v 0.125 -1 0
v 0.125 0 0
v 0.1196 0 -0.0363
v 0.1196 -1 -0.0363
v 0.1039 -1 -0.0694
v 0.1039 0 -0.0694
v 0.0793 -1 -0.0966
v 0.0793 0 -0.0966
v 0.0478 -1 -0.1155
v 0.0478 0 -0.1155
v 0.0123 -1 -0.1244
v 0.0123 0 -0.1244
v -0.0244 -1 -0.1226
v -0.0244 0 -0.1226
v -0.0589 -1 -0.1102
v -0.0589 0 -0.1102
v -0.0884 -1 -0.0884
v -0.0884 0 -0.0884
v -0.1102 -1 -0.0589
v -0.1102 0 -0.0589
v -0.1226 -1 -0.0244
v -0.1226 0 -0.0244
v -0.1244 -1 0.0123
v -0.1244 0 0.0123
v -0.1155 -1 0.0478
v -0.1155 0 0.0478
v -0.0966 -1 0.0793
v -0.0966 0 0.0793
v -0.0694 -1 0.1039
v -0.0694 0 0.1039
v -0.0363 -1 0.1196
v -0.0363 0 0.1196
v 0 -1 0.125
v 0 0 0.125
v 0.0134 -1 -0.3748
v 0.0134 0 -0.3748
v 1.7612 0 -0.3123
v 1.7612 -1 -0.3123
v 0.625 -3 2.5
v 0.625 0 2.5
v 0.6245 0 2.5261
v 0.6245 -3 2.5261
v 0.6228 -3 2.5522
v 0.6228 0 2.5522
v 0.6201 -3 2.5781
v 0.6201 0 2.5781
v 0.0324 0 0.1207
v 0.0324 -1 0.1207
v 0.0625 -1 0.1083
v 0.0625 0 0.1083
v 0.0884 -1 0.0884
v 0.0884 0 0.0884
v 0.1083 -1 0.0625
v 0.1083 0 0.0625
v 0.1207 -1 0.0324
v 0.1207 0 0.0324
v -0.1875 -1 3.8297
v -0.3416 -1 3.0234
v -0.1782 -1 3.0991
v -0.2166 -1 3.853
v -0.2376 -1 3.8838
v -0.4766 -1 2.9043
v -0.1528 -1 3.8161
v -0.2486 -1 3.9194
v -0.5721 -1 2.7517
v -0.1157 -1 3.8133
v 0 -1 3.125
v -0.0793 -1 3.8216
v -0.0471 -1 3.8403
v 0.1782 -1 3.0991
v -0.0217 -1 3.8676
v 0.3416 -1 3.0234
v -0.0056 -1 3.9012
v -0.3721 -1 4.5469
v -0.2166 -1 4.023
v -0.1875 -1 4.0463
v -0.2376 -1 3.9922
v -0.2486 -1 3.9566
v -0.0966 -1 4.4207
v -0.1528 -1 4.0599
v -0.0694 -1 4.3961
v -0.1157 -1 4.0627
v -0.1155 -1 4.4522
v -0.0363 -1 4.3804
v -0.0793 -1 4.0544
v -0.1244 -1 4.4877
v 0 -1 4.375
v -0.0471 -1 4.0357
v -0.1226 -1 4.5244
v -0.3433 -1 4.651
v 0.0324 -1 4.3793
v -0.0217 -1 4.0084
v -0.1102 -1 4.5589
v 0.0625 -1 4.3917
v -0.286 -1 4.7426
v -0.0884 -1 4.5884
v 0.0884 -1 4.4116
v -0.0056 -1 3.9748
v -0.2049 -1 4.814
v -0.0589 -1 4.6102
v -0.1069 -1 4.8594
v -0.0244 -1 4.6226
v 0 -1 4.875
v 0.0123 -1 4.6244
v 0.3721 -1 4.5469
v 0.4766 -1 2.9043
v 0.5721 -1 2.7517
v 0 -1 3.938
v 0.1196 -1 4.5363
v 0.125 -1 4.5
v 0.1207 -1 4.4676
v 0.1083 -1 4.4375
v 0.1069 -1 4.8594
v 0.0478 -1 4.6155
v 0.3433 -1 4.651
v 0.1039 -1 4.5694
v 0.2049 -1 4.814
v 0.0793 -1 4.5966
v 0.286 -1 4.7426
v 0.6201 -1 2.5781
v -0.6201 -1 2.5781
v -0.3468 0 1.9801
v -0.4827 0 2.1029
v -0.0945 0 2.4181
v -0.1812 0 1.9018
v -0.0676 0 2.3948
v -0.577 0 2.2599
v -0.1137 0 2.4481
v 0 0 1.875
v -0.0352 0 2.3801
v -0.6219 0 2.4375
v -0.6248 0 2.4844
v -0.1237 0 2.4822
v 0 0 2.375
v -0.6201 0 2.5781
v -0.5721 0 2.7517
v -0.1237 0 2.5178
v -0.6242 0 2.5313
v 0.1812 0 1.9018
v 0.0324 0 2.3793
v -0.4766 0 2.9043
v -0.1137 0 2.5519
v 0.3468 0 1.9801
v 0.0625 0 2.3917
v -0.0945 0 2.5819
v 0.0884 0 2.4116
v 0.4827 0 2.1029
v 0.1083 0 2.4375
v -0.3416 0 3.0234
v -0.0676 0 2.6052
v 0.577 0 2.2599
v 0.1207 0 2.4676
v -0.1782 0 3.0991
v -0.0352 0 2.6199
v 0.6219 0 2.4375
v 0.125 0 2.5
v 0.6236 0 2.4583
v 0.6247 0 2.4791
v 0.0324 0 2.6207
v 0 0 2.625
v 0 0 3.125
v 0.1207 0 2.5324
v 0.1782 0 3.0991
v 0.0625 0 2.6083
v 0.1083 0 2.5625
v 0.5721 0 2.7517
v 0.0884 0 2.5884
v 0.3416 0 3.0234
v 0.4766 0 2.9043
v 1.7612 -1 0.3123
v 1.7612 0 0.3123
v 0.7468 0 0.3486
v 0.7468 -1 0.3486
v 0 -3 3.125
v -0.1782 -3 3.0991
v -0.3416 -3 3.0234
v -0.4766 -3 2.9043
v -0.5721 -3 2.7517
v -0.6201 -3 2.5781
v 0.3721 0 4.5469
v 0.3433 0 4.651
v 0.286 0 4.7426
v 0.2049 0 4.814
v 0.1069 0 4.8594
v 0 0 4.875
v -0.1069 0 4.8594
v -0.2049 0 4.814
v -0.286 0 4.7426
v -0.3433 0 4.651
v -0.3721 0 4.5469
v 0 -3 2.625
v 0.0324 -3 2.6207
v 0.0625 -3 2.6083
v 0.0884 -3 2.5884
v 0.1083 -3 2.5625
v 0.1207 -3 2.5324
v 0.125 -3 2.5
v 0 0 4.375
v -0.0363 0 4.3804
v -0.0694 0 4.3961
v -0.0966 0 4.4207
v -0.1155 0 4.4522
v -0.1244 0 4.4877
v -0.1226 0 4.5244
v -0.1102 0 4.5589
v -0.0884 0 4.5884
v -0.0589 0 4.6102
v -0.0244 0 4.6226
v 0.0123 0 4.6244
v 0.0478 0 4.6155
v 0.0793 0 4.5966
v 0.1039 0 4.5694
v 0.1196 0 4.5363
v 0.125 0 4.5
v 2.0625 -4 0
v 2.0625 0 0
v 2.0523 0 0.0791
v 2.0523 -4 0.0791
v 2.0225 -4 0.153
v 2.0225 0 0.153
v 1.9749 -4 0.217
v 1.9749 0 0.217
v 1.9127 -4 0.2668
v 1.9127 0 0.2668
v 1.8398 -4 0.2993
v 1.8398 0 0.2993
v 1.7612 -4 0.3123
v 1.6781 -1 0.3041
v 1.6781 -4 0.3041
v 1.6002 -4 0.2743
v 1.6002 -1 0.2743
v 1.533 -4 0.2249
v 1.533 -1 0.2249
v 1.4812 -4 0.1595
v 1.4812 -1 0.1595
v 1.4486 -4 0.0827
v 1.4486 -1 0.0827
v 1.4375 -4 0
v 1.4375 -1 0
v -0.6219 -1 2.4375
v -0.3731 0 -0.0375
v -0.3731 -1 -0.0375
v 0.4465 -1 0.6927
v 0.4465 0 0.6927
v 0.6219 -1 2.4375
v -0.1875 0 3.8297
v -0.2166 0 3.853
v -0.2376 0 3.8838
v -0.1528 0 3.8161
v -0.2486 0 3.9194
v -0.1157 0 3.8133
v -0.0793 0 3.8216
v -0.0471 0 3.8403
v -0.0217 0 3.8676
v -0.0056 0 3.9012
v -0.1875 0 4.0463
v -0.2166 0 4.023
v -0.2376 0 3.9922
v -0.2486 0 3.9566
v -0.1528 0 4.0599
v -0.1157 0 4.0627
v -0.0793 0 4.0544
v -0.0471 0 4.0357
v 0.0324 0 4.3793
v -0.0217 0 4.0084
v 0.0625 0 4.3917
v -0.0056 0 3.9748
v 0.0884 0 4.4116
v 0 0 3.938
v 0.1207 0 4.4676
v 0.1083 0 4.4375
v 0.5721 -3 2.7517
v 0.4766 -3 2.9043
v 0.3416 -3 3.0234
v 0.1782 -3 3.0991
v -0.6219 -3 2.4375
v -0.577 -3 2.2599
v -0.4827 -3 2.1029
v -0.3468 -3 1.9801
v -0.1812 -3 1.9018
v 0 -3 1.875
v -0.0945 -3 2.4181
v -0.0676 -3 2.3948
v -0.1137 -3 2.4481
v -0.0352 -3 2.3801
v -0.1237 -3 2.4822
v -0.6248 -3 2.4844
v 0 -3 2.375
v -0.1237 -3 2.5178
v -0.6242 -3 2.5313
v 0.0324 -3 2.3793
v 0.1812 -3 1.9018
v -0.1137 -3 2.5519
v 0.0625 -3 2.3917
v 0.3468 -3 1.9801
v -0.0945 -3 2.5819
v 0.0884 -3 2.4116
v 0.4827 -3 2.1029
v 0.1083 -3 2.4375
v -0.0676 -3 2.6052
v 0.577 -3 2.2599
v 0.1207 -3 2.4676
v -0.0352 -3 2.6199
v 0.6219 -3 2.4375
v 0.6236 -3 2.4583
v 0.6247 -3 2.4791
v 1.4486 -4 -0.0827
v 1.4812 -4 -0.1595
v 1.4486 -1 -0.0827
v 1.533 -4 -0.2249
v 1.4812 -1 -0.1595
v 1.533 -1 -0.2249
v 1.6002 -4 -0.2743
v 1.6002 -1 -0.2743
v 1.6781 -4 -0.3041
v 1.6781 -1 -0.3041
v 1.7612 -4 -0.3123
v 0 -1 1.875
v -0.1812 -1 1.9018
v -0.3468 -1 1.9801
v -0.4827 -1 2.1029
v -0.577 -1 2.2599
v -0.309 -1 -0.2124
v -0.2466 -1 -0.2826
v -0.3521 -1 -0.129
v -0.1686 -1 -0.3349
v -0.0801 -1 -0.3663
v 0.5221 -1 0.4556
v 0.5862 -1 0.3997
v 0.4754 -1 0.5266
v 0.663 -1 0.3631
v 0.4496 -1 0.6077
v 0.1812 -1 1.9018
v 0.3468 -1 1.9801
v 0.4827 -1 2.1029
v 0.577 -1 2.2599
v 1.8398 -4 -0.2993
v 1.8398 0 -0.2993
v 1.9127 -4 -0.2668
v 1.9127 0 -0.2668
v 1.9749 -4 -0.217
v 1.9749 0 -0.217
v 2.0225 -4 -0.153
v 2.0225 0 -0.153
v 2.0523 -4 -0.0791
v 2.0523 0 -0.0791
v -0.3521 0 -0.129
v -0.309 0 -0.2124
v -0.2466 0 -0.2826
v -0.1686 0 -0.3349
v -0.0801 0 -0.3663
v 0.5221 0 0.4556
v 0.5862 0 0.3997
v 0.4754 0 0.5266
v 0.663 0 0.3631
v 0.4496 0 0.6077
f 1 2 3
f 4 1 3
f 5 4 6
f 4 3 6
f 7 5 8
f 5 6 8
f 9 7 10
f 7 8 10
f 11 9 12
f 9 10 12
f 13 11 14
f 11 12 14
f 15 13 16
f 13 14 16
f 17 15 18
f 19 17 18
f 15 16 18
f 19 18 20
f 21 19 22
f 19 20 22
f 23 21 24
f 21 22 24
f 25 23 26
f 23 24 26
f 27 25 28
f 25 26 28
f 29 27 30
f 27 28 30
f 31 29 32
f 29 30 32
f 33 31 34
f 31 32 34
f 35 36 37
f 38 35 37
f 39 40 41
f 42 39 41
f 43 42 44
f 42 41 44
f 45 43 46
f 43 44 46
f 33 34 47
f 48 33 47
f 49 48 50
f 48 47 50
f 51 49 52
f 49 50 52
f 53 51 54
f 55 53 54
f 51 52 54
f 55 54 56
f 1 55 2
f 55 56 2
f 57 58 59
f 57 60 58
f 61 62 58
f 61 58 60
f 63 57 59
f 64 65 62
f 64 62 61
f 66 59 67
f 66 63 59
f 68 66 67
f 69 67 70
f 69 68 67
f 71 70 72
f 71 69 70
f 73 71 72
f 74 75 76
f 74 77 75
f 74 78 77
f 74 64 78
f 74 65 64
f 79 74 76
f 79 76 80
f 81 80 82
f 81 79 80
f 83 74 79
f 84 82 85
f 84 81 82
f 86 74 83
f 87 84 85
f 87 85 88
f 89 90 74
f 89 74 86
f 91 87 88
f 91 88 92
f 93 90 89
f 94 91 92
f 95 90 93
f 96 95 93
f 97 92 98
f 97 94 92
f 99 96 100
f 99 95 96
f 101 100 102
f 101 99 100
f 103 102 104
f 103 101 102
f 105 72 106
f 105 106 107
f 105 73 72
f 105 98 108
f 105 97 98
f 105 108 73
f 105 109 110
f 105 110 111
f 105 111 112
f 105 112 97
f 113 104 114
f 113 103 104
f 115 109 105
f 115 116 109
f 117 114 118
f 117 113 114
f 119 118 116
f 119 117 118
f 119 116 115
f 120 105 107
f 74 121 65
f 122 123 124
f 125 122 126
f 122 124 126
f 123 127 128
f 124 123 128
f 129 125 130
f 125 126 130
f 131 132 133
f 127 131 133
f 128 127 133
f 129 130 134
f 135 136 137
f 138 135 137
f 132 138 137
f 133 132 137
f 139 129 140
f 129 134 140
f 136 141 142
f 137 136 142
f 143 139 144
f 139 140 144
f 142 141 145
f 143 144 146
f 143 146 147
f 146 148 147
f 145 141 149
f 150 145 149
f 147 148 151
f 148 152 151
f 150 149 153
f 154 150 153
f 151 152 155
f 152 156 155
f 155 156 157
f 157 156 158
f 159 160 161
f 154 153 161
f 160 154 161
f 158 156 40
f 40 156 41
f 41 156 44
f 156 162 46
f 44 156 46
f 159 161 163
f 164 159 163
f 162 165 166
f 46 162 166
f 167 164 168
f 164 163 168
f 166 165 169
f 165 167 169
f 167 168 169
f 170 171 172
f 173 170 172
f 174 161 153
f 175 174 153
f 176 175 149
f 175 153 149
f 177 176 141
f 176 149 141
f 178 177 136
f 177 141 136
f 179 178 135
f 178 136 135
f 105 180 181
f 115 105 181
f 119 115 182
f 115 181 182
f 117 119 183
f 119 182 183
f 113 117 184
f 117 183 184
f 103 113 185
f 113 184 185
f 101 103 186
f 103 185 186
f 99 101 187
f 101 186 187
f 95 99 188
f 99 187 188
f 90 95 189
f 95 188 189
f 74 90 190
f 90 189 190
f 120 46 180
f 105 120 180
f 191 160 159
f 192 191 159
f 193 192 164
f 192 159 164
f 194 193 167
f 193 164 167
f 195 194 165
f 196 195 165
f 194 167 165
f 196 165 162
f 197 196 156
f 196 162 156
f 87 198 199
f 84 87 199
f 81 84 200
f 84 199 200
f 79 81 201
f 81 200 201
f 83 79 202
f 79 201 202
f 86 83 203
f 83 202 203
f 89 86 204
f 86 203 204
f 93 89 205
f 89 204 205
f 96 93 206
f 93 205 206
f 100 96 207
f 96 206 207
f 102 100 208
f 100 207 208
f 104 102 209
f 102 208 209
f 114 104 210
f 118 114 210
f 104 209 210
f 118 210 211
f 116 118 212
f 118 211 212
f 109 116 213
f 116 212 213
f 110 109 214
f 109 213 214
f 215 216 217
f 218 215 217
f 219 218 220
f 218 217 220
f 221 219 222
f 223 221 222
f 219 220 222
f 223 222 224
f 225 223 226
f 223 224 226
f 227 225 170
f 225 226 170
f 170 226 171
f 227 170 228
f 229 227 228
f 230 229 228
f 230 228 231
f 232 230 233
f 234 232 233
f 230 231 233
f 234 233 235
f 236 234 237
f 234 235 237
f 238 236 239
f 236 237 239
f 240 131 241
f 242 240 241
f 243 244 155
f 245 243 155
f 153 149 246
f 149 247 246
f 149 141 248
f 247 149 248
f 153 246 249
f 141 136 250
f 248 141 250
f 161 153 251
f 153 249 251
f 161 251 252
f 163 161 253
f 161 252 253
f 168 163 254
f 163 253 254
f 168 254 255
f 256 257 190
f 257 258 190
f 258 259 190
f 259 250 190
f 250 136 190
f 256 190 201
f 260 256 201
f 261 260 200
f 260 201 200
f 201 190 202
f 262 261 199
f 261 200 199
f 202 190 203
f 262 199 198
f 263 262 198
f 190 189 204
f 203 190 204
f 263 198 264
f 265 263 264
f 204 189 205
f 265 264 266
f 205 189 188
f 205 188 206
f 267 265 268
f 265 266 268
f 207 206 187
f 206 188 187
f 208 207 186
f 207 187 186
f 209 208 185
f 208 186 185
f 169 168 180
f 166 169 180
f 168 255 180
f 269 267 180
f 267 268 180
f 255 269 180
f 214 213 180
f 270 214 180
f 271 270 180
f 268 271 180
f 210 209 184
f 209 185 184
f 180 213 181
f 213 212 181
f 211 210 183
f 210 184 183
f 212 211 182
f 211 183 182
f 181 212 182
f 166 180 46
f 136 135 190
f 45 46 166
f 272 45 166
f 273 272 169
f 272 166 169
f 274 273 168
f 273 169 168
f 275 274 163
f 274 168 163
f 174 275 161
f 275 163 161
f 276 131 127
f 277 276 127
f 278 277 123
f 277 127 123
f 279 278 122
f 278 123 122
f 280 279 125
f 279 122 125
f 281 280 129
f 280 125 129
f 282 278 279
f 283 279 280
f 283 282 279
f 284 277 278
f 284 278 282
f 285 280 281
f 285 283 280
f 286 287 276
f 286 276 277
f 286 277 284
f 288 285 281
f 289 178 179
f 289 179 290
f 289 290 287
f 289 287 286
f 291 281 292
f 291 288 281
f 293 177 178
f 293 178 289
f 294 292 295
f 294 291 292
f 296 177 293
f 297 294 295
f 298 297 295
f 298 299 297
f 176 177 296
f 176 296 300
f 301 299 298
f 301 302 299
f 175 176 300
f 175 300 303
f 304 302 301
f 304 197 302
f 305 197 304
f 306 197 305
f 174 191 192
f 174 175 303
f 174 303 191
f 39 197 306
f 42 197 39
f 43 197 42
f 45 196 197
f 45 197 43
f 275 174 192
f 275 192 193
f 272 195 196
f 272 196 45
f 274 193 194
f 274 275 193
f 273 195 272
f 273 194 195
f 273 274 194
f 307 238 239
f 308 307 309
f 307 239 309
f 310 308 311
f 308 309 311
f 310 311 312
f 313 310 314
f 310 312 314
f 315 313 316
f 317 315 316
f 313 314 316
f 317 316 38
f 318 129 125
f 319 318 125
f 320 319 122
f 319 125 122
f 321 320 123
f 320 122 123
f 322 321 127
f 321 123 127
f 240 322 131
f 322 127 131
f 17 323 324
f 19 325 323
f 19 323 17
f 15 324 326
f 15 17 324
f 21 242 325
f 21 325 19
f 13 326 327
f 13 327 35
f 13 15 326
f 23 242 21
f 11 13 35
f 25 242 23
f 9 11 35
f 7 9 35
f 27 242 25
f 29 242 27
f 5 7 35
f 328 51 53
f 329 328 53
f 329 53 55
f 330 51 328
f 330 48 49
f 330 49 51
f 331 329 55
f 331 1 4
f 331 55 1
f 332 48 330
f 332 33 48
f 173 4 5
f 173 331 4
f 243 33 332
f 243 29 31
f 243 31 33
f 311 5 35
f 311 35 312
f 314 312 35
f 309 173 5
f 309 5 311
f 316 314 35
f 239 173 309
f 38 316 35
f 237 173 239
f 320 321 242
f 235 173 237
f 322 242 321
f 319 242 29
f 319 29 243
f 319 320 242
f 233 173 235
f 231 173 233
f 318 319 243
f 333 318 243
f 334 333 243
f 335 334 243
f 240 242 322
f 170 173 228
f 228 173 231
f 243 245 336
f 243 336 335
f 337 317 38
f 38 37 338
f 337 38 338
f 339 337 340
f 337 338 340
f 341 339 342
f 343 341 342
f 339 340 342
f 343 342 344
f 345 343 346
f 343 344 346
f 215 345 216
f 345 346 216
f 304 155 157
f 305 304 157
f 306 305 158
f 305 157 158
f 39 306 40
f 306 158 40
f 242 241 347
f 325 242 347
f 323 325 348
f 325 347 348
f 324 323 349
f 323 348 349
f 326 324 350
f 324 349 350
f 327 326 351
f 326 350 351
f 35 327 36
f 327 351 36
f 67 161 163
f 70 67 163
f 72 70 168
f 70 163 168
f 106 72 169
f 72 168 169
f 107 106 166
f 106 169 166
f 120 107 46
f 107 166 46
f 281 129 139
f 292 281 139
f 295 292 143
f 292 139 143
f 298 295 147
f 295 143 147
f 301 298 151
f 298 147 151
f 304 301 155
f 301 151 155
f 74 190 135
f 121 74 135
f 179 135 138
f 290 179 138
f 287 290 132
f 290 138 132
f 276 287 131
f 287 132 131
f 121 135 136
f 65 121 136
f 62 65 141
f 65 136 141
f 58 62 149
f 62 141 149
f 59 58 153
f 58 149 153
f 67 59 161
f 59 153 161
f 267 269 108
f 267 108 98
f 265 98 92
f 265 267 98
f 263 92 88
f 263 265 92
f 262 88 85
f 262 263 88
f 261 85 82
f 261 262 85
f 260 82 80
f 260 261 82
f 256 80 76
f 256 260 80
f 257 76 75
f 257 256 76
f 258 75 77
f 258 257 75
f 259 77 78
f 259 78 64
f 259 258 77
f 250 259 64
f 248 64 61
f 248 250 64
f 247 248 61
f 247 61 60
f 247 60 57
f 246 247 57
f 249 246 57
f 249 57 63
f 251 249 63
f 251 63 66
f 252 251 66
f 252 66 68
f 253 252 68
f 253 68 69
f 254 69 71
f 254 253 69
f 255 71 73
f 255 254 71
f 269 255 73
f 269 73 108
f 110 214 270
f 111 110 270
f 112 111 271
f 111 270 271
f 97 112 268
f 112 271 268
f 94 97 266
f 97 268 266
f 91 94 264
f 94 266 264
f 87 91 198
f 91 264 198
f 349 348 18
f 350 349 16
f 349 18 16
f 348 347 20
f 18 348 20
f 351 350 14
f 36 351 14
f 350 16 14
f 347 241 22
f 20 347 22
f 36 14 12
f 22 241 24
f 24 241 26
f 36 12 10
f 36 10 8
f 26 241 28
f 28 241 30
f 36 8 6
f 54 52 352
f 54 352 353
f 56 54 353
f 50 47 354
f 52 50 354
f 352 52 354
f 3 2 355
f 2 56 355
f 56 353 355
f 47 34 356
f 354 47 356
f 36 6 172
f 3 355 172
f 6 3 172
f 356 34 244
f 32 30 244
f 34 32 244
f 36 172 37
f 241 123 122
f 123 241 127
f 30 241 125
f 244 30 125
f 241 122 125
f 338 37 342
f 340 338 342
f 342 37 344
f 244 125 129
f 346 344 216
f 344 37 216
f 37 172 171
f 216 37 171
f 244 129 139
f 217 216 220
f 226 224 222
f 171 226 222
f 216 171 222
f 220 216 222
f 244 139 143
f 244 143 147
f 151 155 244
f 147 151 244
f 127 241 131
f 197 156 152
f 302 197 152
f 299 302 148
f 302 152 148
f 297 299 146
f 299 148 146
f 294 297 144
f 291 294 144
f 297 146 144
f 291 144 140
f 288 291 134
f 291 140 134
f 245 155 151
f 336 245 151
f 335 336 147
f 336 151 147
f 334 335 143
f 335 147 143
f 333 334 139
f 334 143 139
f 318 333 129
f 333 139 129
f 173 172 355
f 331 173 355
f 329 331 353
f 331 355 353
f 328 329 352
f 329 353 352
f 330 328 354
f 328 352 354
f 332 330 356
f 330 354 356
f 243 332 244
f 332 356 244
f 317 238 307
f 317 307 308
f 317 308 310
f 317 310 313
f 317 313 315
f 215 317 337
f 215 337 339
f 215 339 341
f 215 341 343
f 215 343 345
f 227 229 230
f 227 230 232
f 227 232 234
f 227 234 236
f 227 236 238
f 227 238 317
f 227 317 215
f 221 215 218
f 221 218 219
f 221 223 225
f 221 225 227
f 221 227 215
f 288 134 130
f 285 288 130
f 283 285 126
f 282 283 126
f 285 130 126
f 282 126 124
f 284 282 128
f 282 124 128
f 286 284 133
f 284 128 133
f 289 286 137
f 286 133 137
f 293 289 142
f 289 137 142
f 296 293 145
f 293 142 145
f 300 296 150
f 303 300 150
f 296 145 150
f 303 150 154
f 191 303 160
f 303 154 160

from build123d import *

# Parameters (mm, degrees)
F1_DEPTH = 1
F0_R     = 0.125
F2_DEPTH = 3
F3_DEPTH = 4


with BuildPart() as f1:
    # F0 (on Front) → F1 (new body)
    with BuildSketch(Plane.XZ):
        with BuildLine():
            Line((1.4375, 0), (0.375, 0))
            ThreePointArc((0.375, 0), (0.2698585939, -0.2603869031), (0.0133928571, -0.3747607655))
            Line((0.0133928571, -0.3747607655), (1.7611607143, -0.3123006379))
            ThreePointArc((1.7611607143, -0.3123006379), (1.5330109141, -0.2248821616), (1.4375, 0))
        make_face()
        with BuildLine():
            Line((0.375, 0), (0.125, 0))
            ThreePointArc((0.125, 0), (-0.0883883476, -0.0883883476), (0, 0.125))
            Line((0, 0.125), (0, 0.375))
            ThreePointArc((0, 0.375), (-0.2781074433, 0.2515576475), (-0.3731202889, -0.0375))
            ThreePointArc((-0.3731202889, -0.0375), (-0.2465505268, -0.2825559019), (0.0133928571, -0.3747607655))
            ThreePointArc((0.0133928571, -0.3747607655), (0.2698585939, -0.2603869031), (0.375, 0))
        make_face()
        with BuildLine():
            ThreePointArc((0, 0.375), (0.2651650429, 0.2651650429), (0.375, 0))
            Line((0.375, 0), (1.4375, 0))
            ThreePointArc((1.4375, 0), (1.5330109141, 0.2248821616), (1.7611607143, 0.3123006379))
            Line((1.7611607143, 0.3123006379), (0.7467559055, 0.3485525083))
            ThreePointArc((0.7467559055, 0.3485525083), (0.5220944841, 0.4555653209), (0.4465034091, 0.6926528273))
            Line((0.4465034091, 0.6926528273), (0.6218671482, 2.4375))
            ThreePointArc((0.6218671482, 2.4375), (0.4192627458, 2.0364875946), (0, 1.875))
            Line((0, 1.875), (0, 0.375))
        make_face()
        with BuildLine():
            ThreePointArc((-0.3731202889, -0.0375), (-0.2781074433, 0.2515576475), (0, 0.375))
            Line((0, 0.375), (0, 1.875))
            ThreePointArc((0, 1.875), (-0.4192627458, 2.0364875946), (-0.6218671482, 2.4375))
            Line((-0.6218671482, 2.4375), (-0.3731202889, -0.0375))
        make_face()
        with BuildLine():
            ThreePointArc((0, 0.125), (0.0883883476, 0.0883883476), (0.125, 0))
            Line((0.125, 0), (0.375, 0))
            ThreePointArc((0.375, 0), (0.2651650429, 0.2651650429), (0, 0.375))
            Line((0, 0.375), (0, 0.125))
        make_face()
    extrude(amount=F1_DEPTH)

    # F0 (on Front) → F3 (join)
    with BuildSketch(Plane.XZ):
        with BuildLine():
            ThreePointArc((1.7611607143, 0.3123006379), (1.5330109141, 0.2248821616), (1.4375, 0))
            ThreePointArc((1.4375, 0), (1.5330109141, -0.2248821616), (1.7611607143, -0.3123006379))
            ThreePointArc((1.7611607143, -0.3123006379), (1.9748821616, -0.2169890859), (2.0625, 0))
            ThreePointArc((2.0625, 0), (1.9748821616, 0.2169890859), (1.7611607143, 0.3123006379))
        make_face()
        with BuildLine():
            ThreePointArc((1.875, 0), (1.75, -0.125), (1.625, 0))
            ThreePointArc((1.625, 0), (1.75, 0.125), (1.875, 0))
        make_face(mode=Mode.SUBTRACT)
        with BuildLine():
            ThreePointArc((1.875, 0), (1.75, 0.125), (1.625, 0))
            ThreePointArc((1.625, 0), (1.75, -0.125), (1.875, 0))
        make_face()
    extrude(amount=F3_DEPTH)


with BuildPart() as f1b:
    # F0 (on Front) → F1, piece 2 (new body)
    with BuildSketch(Plane.XZ):
        with BuildLine():
            Line((0, 3.938), (0, 3.125))
            ThreePointArc((0, 3.125), (0.4133986424, 2.96875), (0.6200979635, 2.578125))
            Line((0.6200979635, 2.578125), (0.3720587781, 4.546875))
            ThreePointArc((0.3720587781, 4.546875), (0.3742639722, 4.5234835922), (0.375, 4.5))
            ThreePointArc((0.375, 4.5), (0.2651650429, 4.2348349571), (0, 4.125))
            Line((0, 4.125), (0, 3.938))
        make_face()
        with BuildLine():
            Line((-0.3720587781, 4.546875), (-0.6200979635, 2.578125))
            ThreePointArc((-0.6200979635, 2.578125), (-0.4133986424, 2.96875), (0, 3.125))
            Line((0, 3.125), (0, 3.938))
            Line((0, 3.938), (0, 4.125))
            ThreePointArc((0, 4.125), (-0.28125, 4.2519608146), (-0.3720587781, 4.546875))
        make_face()
        with Locations((-0.125, 3.938)):
            Circle(F0_R, mode=Mode.SUBTRACT)
        with BuildLine():
            ThreePointArc((0.3720587781, 4.546875), (0, 4.875), (-0.3720587781, 4.546875))
            ThreePointArc((-0.3720587781, 4.546875), (-0.28125, 4.2519608146), (0, 4.125))
            ThreePointArc((0, 4.125), (0.2651650429, 4.2348349571), (0.375, 4.5))
            ThreePointArc((0.375, 4.5), (0.3742639722, 4.5234835922), (0.3720587781, 4.546875))
        make_face()
        with BuildLine():
            ThreePointArc((0.125, 4.5), (0.0883883476, 4.4116116524), (0, 4.375))
            ThreePointArc((0, 4.375), (-0.0883883476, 4.5883883476), (0.125, 4.5))
        make_face(mode=Mode.SUBTRACT)
    extrude(amount=F1_DEPTH)


with BuildPart() as f2:
    # F0 (on Front) → F2 (new body)
    with BuildSketch(Plane.XZ):
        with BuildLine():
            Line((0, 2.375), (0, 1.875))
            ThreePointArc((0, 1.875), (0.4192627458, 2.0364875946), (0.6218671482, 2.4375))
            ThreePointArc((0.6218671482, 2.4375), (0.6242162957, 2.4687107656), (0.625, 2.5))
            ThreePointArc((0.625, 2.5), (0.623773287, 2.5391393203), (0.6200979635, 2.578125))
            ThreePointArc((0.6200979635, 2.578125), (0.4133986424, 2.96875), (0, 3.125))
            Line((0, 3.125), (0, 2.625))
            ThreePointArc((0, 2.625), (0.0883883476, 2.5883883476), (0.125, 2.5))
            ThreePointArc((0.125, 2.5), (0.0883883476, 2.4116116524), (0, 2.375))
        make_face()
        with BuildLine():
            ThreePointArc((-0.6218671482, 2.4375), (-0.4192627458, 2.0364875946), (0, 1.875))
            Line((0, 1.875), (0, 2.375))
            ThreePointArc((0, 2.375), (-0.125, 2.5), (0, 2.625))
            Line((0, 2.625), (0, 3.125))
            ThreePointArc((0, 3.125), (-0.4133986424, 2.96875), (-0.6200979635, 2.578125))
            ThreePointArc((-0.6200979635, 2.578125), (-0.6249505439, 2.5078624207), (-0.6218671482, 2.4375))
        make_face()
    extrude(amount=F2_DEPTH)


solid = Compound([f1.part, f1b.part, f2.part])
